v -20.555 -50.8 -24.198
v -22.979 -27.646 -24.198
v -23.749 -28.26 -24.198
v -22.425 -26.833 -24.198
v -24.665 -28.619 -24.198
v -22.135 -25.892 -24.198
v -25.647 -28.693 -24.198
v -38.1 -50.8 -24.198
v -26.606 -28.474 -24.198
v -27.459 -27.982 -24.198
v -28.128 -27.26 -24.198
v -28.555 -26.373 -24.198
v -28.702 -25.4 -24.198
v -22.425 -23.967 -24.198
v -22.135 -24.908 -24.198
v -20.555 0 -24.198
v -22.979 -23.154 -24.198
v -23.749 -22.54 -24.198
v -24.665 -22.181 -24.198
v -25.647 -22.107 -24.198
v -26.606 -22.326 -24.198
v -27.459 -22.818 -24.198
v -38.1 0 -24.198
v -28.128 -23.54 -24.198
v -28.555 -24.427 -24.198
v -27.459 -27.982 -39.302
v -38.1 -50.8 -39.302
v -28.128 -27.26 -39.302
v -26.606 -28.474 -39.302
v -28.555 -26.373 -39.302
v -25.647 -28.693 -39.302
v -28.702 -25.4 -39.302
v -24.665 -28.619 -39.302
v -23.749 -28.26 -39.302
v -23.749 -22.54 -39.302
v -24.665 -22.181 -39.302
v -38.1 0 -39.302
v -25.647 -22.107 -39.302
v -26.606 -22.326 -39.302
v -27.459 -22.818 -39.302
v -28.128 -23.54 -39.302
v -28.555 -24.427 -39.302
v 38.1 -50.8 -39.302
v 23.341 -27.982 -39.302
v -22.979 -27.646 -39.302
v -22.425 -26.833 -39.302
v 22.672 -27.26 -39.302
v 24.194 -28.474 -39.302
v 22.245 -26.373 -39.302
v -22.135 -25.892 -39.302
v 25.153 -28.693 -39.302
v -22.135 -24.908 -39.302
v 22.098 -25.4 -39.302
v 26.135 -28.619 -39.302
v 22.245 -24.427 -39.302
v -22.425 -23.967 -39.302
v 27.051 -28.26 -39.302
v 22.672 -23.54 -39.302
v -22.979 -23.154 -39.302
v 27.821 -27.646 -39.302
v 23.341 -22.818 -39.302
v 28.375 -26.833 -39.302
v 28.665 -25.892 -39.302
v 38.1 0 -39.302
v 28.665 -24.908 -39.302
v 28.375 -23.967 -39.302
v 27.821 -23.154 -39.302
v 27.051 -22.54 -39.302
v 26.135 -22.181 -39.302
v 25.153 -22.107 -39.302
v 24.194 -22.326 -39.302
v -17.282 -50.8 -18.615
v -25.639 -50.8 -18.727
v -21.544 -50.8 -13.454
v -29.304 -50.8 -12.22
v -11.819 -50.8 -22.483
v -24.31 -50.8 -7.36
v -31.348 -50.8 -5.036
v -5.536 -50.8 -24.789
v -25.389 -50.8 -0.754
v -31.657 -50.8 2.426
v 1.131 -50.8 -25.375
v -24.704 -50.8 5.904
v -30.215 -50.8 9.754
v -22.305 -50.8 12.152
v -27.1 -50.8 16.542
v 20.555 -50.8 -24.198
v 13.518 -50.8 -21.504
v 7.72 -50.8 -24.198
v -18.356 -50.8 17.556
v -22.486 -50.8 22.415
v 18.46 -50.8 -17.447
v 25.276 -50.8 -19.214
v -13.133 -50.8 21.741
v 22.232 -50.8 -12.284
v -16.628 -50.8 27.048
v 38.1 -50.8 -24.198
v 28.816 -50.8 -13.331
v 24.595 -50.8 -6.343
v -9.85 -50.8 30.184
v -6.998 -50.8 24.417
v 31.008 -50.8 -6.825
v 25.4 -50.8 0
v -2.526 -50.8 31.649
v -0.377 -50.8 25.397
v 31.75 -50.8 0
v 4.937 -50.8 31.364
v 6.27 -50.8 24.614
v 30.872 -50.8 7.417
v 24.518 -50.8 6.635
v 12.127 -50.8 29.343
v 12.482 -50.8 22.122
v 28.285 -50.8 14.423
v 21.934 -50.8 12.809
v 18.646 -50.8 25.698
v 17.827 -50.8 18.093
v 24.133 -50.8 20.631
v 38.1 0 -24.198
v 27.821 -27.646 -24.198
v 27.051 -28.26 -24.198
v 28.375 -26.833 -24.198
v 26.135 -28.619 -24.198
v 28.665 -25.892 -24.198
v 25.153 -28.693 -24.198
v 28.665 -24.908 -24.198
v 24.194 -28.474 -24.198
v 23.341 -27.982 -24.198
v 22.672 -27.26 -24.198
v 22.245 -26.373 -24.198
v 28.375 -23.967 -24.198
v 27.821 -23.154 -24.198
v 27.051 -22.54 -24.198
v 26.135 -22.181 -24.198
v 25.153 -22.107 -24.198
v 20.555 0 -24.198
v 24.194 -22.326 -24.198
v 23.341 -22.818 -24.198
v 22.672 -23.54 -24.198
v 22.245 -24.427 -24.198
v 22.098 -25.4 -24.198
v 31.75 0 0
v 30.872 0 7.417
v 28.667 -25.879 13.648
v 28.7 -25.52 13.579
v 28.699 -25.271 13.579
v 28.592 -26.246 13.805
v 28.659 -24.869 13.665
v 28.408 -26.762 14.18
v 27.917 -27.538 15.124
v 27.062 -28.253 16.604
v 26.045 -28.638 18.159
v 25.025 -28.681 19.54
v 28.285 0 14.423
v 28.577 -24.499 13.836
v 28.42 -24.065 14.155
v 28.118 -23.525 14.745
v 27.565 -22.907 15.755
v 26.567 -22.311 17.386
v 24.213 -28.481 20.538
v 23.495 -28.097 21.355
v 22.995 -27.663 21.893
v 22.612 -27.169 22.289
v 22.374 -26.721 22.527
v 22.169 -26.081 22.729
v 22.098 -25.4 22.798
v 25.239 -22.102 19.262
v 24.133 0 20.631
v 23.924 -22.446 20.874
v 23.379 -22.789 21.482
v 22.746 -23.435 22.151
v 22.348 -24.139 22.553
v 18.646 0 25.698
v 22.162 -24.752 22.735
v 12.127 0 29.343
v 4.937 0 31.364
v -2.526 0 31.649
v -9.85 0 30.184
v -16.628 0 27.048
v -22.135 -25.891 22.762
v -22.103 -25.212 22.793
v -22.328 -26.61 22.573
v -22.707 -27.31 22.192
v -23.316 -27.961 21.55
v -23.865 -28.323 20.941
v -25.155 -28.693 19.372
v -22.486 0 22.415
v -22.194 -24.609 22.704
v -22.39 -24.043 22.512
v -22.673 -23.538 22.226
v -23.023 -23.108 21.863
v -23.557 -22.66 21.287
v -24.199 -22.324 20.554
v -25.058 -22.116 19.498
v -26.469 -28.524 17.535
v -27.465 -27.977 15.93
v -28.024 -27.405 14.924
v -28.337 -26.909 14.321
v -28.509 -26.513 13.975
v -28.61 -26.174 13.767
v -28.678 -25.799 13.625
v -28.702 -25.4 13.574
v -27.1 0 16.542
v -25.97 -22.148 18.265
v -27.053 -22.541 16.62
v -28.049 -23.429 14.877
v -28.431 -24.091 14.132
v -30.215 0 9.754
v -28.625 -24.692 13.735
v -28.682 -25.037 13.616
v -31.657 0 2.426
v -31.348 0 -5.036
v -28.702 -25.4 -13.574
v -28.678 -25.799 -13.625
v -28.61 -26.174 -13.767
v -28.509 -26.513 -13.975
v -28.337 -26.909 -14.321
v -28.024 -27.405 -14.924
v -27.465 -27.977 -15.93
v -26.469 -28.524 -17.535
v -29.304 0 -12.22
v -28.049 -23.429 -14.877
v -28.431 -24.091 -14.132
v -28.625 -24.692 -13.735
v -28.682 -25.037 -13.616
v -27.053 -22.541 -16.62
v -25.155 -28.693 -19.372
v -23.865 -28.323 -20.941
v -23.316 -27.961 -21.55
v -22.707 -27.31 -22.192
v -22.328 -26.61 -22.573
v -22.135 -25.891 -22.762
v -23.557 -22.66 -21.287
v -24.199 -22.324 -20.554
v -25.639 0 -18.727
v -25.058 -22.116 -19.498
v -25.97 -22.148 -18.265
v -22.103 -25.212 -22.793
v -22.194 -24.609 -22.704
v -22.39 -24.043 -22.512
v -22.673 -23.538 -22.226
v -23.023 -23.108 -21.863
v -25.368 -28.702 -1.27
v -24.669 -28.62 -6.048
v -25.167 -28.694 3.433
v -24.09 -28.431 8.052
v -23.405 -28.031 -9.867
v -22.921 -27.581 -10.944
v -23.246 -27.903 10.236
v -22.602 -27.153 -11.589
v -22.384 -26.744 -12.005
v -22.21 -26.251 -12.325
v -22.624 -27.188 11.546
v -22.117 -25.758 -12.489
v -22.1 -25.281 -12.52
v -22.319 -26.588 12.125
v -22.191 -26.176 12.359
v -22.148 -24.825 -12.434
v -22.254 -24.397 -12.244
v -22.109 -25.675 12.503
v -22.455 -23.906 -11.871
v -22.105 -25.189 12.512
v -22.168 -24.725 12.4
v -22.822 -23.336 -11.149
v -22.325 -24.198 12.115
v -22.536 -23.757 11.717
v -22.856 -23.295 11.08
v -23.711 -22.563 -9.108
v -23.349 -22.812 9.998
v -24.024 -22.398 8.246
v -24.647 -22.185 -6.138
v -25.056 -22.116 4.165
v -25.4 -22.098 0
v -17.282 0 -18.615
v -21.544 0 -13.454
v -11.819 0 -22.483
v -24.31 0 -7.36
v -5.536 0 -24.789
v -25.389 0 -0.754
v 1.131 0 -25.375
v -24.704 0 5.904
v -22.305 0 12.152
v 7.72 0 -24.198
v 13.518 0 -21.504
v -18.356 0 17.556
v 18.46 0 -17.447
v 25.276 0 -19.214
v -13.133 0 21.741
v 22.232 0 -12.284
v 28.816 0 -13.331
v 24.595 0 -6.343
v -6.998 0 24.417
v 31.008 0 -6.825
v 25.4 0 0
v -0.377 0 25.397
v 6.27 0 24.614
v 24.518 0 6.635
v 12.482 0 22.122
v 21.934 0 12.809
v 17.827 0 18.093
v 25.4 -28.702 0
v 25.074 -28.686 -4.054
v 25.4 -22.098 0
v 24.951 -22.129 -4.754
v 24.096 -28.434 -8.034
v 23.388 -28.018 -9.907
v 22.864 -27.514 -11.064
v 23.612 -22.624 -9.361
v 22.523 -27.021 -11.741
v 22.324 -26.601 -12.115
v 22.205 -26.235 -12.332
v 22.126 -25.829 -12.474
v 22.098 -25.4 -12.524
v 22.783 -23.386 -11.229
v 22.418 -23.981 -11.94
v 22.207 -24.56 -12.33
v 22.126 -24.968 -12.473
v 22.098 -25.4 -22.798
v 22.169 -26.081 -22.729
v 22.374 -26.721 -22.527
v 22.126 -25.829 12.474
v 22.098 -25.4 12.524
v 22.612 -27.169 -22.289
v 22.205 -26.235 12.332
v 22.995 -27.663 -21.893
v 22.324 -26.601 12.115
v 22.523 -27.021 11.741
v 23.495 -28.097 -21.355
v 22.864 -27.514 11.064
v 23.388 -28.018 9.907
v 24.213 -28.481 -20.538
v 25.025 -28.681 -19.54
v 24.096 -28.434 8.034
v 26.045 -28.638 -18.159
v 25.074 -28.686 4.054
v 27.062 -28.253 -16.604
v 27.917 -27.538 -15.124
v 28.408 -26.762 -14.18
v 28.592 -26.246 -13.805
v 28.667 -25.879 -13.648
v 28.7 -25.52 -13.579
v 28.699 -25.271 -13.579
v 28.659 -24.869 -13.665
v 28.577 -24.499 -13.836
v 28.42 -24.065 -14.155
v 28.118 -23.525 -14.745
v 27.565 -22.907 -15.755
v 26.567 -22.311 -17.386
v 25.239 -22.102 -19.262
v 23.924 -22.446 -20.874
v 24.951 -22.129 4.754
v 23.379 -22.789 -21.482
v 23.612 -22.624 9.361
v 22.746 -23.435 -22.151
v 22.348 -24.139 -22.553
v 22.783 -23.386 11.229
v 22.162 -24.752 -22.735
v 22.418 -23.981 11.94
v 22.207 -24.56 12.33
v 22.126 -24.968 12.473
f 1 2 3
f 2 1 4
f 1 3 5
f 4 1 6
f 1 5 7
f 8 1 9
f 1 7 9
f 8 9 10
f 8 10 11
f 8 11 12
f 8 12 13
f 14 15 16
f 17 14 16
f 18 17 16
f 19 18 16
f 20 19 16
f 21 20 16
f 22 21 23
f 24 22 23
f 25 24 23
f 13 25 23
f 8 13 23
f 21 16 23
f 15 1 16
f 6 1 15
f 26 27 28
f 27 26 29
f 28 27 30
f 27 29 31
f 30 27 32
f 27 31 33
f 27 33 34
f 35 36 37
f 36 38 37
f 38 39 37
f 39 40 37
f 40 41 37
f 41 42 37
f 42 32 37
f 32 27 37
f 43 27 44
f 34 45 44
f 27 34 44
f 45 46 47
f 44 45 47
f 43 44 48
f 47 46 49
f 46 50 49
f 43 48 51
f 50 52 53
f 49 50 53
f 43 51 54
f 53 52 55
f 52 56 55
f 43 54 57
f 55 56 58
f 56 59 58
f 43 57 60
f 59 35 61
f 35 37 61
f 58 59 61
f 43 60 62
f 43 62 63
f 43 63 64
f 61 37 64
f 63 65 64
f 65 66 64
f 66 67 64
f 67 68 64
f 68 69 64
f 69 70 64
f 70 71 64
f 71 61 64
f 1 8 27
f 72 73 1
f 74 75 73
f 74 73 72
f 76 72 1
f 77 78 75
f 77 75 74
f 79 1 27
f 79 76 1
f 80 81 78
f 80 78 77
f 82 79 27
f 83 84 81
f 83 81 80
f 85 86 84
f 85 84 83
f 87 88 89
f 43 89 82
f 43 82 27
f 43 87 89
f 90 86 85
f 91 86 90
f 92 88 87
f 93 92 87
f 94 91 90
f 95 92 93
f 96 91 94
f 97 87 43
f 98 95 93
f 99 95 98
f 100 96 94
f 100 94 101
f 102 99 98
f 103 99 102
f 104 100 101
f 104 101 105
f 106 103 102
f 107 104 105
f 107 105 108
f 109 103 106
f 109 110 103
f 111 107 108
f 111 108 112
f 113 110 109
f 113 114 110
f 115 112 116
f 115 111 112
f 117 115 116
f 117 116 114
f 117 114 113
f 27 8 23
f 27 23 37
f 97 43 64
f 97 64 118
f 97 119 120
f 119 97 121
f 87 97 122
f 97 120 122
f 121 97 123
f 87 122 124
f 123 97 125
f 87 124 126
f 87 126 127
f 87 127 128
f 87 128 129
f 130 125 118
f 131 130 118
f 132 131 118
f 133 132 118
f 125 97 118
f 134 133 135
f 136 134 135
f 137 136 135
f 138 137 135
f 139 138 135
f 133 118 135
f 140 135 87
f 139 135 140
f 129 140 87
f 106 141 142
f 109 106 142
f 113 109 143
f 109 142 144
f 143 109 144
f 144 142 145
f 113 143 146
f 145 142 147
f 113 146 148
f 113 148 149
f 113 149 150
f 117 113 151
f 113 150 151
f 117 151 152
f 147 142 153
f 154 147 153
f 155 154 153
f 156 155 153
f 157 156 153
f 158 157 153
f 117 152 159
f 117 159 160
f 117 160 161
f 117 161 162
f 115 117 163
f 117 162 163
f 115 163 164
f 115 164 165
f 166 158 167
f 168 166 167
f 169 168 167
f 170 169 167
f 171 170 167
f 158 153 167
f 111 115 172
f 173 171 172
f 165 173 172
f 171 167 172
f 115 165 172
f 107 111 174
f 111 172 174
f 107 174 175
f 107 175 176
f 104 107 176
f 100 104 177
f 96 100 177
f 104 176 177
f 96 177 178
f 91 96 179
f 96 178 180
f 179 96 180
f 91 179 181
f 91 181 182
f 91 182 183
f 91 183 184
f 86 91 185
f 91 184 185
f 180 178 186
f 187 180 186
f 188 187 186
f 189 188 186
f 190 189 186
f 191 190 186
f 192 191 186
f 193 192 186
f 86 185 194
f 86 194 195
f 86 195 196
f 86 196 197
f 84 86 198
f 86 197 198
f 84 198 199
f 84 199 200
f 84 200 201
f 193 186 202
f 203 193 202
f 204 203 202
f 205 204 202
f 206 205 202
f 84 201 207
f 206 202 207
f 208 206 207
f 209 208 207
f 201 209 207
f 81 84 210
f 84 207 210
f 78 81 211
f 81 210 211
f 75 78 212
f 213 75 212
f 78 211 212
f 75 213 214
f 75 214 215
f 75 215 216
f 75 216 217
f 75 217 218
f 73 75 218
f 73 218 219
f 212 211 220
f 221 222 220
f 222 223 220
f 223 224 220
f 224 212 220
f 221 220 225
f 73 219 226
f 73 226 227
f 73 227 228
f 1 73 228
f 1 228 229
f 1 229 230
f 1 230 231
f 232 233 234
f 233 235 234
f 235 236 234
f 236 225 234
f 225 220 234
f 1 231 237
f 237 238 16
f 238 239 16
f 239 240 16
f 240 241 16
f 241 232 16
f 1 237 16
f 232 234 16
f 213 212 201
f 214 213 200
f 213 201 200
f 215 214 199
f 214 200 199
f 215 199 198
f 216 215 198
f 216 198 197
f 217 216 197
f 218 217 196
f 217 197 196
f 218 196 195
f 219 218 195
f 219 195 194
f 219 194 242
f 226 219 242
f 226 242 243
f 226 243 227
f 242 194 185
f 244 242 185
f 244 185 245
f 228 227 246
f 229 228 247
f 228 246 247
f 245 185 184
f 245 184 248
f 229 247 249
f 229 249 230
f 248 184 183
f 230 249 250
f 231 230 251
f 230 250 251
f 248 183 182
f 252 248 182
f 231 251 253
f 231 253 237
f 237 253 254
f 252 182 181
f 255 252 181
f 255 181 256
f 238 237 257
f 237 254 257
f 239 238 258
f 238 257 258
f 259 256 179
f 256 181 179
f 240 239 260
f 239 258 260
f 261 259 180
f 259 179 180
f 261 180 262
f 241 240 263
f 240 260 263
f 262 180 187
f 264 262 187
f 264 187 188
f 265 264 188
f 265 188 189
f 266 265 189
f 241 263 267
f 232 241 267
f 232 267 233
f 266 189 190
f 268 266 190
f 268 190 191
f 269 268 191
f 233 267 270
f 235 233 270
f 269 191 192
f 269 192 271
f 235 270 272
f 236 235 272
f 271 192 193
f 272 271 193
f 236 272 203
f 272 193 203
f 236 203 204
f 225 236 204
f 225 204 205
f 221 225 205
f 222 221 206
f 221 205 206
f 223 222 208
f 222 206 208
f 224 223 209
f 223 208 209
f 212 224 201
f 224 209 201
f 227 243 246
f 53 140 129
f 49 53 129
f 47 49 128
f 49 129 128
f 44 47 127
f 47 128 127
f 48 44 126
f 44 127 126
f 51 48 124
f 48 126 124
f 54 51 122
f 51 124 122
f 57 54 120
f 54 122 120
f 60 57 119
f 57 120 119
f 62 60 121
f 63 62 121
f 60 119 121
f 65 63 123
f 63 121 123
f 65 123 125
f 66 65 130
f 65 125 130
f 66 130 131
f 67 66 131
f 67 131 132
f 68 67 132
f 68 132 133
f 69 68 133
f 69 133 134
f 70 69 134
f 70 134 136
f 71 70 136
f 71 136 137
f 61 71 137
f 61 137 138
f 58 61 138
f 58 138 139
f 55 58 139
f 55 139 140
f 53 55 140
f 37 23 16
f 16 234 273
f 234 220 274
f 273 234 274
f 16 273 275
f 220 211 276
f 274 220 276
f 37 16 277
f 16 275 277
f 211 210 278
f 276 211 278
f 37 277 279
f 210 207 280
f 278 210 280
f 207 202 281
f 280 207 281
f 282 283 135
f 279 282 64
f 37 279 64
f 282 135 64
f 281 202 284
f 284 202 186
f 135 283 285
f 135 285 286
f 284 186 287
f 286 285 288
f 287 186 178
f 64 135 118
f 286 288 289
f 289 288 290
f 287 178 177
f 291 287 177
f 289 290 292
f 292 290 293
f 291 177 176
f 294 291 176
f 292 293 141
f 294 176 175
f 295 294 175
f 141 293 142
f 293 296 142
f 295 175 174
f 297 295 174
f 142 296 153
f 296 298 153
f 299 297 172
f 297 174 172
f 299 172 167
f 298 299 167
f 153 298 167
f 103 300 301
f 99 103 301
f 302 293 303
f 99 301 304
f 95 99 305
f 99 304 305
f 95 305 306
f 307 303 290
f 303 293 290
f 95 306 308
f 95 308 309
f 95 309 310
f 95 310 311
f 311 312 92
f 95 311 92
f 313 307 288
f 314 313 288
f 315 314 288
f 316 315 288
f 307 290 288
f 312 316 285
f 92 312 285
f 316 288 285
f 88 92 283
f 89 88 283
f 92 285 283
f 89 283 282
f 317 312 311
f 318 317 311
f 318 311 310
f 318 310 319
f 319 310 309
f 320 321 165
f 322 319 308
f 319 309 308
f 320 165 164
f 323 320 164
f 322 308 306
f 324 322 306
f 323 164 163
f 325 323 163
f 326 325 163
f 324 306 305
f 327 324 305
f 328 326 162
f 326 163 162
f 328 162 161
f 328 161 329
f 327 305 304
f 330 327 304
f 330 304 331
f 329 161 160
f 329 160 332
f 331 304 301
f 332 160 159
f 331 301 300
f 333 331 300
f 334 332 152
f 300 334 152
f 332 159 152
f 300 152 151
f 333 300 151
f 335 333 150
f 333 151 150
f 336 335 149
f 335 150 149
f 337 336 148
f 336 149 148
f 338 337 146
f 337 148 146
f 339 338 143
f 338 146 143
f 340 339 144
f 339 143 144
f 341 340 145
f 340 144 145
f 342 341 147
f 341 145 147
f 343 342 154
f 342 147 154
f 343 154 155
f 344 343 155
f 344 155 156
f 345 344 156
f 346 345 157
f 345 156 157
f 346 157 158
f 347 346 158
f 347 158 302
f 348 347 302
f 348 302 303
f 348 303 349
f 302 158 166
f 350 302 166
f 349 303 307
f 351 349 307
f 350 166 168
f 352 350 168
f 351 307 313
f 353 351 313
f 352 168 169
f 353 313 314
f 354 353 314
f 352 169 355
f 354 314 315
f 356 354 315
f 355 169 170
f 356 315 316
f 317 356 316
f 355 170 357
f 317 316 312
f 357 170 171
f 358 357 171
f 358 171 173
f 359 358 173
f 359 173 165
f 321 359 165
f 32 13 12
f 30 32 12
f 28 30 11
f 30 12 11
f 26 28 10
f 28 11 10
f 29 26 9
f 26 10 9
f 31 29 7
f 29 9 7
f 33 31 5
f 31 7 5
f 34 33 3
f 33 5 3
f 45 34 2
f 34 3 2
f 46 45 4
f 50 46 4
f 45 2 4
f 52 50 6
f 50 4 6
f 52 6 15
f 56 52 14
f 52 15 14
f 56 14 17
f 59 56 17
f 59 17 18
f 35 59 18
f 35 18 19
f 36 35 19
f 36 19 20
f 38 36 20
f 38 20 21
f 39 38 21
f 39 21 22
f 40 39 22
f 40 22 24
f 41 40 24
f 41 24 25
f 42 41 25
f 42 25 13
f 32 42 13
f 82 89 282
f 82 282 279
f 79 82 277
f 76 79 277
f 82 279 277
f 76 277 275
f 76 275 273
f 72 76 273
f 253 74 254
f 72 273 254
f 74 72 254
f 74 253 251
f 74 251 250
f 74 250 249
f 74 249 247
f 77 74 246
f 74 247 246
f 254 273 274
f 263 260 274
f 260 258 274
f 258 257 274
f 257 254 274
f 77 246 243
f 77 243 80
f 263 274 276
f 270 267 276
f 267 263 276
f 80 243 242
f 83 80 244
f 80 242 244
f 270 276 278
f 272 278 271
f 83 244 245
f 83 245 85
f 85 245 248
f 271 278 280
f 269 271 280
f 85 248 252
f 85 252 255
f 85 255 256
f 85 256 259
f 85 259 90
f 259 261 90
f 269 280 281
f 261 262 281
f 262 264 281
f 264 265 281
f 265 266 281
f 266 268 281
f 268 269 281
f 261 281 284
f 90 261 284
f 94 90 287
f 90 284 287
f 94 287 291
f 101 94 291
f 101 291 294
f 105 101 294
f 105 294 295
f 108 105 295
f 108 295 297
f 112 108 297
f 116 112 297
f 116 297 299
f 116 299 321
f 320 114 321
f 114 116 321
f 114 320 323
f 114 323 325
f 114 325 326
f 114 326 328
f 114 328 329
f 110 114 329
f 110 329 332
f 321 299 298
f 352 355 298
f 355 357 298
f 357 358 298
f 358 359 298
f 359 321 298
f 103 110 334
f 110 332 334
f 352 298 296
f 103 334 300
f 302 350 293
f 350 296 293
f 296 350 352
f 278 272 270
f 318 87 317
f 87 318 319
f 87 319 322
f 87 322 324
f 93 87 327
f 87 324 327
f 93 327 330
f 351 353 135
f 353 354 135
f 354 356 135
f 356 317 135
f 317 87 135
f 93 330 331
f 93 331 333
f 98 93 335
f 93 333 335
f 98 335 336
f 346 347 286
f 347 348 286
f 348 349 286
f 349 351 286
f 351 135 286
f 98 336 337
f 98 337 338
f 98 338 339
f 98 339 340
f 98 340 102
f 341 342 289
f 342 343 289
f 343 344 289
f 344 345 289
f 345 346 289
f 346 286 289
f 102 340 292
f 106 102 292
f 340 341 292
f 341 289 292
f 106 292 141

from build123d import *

# Parameters (mm, degrees)
F1_DEPTH = 50.8
F3_D     = 6.604


with BuildPart() as f1:
    # F0 (on Front) → F1 (new body)
    with BuildSketch(Plane.XZ):
        with BuildLine():
            ThreePointArc((-7.7199247783, -24.1984041089), (-14.9845572279, 20.5090966326), (25.4, 0))
            ThreePointArc((25.4, 0), (20.5090966326, -14.9845572279), (7.7199247783, -24.1984041089))
            Line((7.7199247783, -24.1984041089), (20.5547984321, -24.1984041089))
            ThreePointArc((20.5547984321, -24.1984041089), (28.8155977746, -13.3313099465), (31.75, 0))
            ThreePointArc((31.75, 0), (-13.3313099465, 28.8155977746), (-20.5547984321, -24.1984041089))
            Line((-20.5547984321, -24.1984041089), (-7.7199247783, -24.1984041089))
        make_face()
        with BuildLine():
            ThreePointArc((7.7199247783, -24.1984041089), (0, -25.4), (-7.7199247783, -24.1984041089))
            Line((-7.7199247783, -24.1984041089), (-20.5547984321, -24.1984041089))
            ThreePointArc((-20.5547984321, -24.1984041089), (0, -31.75), (20.5547984321, -24.1984041089))
            Line((20.5547984321, -24.1984041089), (7.7199247783, -24.1984041089))
        make_face()
        with BuildLine():
            ThreePointArc((20.5547984321, -24.1984041089), (0, -31.75), (-20.5547984321, -24.1984041089))
            Line((-20.5547984321, -24.1984041089), (-38.1, -24.1984041089))
            Line((-38.1, -24.1984041089), (-38.1, -39.3015958911))
            Line((-38.1, -39.3015958911), (38.1, -39.3015958911))
            Line((38.1, -39.3015958911), (38.1, -24.1984041089))
            Line((38.1, -24.1984041089), (20.5547984321, -24.1984041089))
        make_face()
    extrude(amount=F1_DEPTH)

    # F3 (through all)
    with Locations(Plane(origin=(0, 0, -39.3015958911), x_dir=(1, 0, 0), z_dir=(0, 0, -1))):
        with Locations((-25.4, 25.4), (25.4, 25.4)):
            Hole(F3_D / 2)


solid = f1.part
